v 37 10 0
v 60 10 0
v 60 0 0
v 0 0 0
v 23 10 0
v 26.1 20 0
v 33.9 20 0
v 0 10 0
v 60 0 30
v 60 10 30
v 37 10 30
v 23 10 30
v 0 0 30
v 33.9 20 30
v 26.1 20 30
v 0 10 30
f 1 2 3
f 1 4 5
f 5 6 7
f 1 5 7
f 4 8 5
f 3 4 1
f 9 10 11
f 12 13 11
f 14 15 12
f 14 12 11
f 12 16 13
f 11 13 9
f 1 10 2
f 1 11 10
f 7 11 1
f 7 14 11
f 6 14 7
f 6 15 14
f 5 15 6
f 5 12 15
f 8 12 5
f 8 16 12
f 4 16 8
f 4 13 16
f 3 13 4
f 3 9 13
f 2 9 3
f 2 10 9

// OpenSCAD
$fn = 32;

// ----------------------------------------------------------------------
// V guide rail: dovetail, 60 mm wide
// ----------------------------------------------------------------------

// --- parameters (mm) ---
rail_w = 60;              // rail width, X
base_t = 10;              // base plate thickness
v_depth = 10;             // V feature depth / height
v_half_w = 7;             // half width of the V at the base face
plate_t = 30;             // rail length, Z (the extrusion height)
top_half_w = 3.9;         // half width at the dovetail top

dovetail_base = 2 * v_half_w;  // dovetail width at the base
dovetail_top = 2 * top_half_w;  // dovetail width at the top

profile = [[0, 0], [60, 0], [60, 10], [37, 10], [33.9, 20], [26.1, 20], [23, 10], [0, 10]];  // primary outline, 8 points, counter clockwise

// --- the one profile operation ---
linear_extrude(height = plate_t) polygon(points = profile);
